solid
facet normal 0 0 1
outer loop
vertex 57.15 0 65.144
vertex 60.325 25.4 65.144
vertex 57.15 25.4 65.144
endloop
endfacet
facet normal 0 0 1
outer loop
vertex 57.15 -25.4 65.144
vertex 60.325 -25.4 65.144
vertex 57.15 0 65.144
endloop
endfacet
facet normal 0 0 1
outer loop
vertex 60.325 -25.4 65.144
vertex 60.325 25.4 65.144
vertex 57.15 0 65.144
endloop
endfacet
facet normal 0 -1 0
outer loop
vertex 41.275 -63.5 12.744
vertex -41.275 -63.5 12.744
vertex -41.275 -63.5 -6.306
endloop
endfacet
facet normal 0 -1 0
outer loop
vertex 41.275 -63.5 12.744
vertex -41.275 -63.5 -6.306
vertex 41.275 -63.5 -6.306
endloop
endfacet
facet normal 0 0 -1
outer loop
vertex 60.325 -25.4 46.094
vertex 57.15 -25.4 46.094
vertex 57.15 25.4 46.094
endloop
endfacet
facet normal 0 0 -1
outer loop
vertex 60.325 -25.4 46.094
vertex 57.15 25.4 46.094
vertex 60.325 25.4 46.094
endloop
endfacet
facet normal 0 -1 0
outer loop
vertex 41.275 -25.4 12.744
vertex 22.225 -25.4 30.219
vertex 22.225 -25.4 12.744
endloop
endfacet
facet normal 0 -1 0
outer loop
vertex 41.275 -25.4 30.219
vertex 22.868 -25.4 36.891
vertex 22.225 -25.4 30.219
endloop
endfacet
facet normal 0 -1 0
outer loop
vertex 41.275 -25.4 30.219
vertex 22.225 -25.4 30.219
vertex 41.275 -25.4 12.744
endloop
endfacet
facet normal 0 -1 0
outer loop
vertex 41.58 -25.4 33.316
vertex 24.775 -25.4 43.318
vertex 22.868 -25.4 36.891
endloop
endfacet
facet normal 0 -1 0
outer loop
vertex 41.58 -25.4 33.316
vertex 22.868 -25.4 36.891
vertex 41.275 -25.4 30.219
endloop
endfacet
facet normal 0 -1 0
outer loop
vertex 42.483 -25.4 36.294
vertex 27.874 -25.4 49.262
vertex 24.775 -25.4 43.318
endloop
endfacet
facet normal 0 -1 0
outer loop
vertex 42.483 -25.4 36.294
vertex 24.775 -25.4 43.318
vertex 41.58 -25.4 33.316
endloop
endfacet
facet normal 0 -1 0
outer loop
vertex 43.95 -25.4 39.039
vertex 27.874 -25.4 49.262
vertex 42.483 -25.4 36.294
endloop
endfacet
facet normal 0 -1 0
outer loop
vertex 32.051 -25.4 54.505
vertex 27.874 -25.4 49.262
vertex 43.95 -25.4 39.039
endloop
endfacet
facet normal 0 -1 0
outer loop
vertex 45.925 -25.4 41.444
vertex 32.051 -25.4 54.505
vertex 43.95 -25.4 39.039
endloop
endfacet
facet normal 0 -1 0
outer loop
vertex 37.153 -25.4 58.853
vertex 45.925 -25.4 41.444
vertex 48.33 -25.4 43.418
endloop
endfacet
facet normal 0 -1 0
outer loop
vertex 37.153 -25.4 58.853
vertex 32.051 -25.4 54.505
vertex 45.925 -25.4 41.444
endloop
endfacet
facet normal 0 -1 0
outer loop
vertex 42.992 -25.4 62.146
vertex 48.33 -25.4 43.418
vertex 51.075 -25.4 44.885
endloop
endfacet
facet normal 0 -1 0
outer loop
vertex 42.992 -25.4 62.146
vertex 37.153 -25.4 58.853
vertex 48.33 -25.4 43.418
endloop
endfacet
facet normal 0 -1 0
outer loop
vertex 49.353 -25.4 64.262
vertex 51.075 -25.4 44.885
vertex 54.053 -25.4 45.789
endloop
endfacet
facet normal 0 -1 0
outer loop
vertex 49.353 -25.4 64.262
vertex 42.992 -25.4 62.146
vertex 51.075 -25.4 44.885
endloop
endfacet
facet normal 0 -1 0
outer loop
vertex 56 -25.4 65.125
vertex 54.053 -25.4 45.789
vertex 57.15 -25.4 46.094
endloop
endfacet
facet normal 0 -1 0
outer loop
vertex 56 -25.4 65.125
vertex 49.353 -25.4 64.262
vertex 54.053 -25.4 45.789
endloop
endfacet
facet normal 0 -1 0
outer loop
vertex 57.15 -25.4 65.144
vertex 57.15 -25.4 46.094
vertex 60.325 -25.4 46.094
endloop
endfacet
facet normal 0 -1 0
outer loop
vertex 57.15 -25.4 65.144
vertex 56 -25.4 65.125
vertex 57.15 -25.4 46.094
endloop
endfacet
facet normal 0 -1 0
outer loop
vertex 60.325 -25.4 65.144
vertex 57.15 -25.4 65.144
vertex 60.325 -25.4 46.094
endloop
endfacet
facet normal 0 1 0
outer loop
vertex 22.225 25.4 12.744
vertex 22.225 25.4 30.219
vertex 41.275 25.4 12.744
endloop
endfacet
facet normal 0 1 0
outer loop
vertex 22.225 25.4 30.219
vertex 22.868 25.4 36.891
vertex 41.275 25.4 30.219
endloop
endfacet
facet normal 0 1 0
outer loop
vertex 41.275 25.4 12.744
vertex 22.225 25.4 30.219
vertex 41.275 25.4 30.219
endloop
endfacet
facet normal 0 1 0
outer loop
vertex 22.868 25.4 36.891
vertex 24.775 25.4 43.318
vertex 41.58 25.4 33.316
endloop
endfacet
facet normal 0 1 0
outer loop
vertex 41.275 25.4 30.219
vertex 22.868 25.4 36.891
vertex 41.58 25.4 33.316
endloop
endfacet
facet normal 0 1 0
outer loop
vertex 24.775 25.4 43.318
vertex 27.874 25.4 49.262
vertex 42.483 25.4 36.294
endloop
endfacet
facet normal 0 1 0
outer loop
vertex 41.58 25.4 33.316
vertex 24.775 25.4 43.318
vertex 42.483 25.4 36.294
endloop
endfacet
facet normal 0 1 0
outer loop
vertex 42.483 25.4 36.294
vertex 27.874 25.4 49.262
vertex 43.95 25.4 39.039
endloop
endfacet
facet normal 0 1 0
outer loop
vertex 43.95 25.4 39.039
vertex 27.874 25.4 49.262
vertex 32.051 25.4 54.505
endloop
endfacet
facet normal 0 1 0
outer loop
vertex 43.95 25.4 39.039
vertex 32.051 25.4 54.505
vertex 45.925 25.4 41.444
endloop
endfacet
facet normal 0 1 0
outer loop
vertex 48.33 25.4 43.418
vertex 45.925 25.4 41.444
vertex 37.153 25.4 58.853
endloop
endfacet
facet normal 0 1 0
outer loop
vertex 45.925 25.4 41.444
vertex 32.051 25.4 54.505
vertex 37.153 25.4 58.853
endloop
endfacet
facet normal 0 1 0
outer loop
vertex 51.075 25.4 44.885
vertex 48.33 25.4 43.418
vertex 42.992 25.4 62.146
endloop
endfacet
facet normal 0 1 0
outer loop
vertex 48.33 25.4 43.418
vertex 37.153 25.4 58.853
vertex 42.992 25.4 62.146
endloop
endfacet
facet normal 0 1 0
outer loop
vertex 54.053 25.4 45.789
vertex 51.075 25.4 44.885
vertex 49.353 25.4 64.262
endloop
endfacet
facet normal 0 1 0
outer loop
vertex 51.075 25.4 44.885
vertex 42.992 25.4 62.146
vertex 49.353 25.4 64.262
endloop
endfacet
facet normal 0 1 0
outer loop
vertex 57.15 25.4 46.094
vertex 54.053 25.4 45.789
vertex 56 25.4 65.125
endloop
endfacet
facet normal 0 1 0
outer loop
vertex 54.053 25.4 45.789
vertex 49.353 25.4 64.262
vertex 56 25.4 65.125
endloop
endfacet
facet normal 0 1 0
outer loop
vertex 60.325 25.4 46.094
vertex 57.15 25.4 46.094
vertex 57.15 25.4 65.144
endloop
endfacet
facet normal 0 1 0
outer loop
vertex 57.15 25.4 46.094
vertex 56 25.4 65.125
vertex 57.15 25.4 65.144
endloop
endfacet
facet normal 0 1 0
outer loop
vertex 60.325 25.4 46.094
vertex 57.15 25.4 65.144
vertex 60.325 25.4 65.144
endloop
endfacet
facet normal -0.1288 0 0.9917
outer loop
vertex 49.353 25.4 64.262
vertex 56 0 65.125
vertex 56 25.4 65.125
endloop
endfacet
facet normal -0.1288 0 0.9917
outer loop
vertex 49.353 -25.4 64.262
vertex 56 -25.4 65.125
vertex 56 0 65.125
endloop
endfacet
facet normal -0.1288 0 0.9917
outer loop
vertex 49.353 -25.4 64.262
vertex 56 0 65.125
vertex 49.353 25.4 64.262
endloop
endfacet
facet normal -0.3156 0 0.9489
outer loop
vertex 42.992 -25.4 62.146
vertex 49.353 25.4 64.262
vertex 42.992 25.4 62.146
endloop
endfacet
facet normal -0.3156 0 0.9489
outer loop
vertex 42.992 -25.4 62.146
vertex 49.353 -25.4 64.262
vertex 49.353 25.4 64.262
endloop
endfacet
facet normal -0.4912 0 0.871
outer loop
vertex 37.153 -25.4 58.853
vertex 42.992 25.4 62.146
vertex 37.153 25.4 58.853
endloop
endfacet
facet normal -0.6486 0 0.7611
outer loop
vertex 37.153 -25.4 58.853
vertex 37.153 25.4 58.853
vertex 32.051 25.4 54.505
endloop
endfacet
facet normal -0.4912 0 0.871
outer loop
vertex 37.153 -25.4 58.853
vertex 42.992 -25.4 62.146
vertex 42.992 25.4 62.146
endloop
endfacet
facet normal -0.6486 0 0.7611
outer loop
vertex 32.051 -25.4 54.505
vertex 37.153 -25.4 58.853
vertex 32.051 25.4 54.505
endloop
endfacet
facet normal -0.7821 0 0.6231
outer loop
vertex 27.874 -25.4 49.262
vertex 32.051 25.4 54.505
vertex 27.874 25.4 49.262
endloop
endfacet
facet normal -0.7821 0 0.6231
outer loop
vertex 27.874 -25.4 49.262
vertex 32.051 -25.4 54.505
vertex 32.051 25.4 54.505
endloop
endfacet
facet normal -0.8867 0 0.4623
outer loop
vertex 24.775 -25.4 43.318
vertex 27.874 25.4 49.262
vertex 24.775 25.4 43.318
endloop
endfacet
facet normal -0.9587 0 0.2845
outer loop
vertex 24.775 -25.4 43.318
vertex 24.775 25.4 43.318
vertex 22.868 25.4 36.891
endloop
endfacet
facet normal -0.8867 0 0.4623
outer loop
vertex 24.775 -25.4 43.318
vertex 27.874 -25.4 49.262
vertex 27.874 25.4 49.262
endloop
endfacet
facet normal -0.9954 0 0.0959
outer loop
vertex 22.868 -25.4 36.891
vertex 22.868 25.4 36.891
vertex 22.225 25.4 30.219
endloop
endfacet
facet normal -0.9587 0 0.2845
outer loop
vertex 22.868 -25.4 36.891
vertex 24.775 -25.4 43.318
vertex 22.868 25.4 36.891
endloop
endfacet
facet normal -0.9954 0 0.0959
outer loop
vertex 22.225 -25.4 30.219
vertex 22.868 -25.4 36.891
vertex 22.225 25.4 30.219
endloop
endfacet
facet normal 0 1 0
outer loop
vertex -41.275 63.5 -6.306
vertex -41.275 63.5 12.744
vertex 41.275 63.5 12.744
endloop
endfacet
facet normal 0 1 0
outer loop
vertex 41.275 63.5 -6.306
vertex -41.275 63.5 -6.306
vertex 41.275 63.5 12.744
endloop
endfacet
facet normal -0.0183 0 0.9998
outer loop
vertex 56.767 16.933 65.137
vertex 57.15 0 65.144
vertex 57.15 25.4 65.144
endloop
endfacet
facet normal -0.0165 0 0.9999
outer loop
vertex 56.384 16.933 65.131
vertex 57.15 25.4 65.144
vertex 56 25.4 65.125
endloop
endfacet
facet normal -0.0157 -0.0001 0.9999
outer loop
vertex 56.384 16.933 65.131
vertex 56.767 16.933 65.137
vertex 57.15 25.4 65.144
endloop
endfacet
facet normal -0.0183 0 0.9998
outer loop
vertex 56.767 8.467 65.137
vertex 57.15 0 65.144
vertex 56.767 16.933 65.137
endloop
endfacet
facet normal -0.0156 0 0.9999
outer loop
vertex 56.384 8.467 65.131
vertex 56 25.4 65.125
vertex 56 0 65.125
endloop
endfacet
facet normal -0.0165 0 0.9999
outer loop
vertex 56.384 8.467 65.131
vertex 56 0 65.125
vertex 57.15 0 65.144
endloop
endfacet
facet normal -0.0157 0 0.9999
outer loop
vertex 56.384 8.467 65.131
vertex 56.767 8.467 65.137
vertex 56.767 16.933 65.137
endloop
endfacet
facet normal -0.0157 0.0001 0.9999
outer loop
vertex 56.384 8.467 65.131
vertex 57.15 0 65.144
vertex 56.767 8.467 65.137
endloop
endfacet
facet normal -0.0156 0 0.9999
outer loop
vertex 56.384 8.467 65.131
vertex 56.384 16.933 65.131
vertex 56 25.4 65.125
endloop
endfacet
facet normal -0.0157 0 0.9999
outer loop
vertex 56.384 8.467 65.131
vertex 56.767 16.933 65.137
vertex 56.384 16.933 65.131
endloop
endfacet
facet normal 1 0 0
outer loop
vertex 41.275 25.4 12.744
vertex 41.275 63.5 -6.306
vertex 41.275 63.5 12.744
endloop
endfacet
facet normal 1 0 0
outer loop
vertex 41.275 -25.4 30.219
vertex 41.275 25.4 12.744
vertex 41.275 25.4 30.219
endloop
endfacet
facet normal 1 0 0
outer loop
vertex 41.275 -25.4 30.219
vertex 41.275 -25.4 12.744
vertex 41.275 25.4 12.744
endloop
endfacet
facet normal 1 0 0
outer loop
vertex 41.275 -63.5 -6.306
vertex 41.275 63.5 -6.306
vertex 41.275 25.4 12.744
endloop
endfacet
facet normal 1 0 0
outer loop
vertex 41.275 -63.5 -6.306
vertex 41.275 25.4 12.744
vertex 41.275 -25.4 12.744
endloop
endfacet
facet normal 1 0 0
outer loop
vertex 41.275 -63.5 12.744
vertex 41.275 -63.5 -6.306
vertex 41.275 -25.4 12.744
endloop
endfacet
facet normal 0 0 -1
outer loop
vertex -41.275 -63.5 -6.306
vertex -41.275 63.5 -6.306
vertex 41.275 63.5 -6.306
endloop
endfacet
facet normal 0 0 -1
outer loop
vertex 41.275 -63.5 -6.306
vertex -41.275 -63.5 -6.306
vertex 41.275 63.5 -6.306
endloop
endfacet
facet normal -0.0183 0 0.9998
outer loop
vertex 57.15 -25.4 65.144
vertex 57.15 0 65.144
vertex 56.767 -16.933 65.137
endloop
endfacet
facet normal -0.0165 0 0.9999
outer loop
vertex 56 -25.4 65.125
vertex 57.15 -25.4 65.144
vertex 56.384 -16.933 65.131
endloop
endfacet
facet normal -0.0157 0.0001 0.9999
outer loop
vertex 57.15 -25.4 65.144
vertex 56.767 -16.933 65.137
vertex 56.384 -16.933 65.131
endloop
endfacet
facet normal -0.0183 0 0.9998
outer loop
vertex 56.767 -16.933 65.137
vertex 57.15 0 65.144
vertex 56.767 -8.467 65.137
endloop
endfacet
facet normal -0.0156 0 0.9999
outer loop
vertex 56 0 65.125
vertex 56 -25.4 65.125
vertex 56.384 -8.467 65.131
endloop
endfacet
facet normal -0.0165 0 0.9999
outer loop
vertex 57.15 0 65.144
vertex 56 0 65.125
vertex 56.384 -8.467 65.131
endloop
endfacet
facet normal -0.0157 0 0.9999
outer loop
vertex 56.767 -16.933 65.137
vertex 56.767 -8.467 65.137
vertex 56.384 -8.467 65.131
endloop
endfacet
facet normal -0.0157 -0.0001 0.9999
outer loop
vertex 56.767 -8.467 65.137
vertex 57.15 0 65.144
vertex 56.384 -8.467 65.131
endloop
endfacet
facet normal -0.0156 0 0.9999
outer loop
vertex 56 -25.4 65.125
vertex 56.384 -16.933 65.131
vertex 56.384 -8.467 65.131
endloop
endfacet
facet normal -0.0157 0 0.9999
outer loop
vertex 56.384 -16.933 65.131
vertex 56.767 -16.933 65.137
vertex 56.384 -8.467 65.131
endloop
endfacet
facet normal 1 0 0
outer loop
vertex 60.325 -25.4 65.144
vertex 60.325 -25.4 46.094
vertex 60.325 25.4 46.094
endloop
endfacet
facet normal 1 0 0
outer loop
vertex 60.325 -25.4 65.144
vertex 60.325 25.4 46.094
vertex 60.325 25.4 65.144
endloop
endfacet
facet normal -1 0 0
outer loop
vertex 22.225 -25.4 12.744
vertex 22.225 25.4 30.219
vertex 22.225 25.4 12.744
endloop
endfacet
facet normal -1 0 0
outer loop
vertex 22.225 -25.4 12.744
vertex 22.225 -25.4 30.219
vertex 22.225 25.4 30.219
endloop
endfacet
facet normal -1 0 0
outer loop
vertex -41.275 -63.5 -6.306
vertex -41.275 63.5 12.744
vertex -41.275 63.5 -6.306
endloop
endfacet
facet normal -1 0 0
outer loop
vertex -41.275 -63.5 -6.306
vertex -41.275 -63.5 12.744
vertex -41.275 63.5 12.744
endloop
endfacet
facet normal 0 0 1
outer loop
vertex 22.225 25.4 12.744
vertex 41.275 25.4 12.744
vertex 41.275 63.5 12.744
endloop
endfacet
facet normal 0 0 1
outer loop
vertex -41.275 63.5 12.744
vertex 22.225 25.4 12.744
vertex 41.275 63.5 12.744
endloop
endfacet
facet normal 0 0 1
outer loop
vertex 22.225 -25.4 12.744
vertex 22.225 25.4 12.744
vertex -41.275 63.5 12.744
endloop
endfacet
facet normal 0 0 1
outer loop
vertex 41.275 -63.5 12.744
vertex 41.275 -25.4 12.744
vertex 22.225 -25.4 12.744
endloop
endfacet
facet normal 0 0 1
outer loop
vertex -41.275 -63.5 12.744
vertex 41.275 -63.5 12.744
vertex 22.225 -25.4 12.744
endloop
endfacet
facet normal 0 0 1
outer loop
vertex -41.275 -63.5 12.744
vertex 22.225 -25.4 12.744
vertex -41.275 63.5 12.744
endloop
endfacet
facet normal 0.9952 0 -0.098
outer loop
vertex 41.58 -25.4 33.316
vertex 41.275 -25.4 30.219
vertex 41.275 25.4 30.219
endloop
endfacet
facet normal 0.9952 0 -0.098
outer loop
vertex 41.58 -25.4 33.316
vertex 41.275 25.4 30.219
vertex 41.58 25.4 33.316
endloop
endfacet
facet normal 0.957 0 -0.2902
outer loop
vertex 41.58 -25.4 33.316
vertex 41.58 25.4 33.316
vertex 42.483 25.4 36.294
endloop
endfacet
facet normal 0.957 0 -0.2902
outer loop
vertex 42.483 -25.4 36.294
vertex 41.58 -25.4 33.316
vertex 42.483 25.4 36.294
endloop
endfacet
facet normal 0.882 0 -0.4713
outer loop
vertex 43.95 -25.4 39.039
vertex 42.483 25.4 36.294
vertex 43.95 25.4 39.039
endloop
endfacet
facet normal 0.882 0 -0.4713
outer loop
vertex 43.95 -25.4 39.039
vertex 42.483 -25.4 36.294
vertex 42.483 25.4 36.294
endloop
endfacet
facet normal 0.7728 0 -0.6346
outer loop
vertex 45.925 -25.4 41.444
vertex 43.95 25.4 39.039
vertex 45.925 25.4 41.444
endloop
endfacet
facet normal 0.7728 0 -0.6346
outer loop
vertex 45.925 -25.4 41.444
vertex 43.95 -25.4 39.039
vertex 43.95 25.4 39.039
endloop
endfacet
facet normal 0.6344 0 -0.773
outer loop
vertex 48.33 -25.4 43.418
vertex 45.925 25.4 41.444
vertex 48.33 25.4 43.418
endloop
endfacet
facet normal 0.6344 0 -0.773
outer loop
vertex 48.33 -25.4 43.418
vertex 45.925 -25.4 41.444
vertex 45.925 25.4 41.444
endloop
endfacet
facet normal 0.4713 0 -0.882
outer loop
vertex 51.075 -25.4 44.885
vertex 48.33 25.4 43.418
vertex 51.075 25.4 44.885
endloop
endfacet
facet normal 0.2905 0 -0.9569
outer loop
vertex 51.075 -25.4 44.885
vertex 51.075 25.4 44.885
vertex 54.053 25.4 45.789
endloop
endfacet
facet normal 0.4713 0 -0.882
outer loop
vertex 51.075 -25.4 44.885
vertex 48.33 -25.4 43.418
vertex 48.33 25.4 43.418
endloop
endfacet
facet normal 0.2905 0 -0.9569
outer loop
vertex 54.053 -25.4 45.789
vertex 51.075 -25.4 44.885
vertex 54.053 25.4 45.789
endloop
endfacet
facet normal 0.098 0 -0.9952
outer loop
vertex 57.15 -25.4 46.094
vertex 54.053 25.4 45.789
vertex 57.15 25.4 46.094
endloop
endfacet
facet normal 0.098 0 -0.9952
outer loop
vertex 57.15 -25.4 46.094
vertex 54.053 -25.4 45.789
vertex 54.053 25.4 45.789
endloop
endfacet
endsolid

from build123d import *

# Parameters (mm, degrees)
F1_DEPTH = 63.5
F2_DEPTH = 25.4


# Not quite as in the source:
# - a feature of the source that left no trace in its solid (it failed there, or was rolled back) is left out


with BuildPart() as f1:
    # F0 (on Front) → F1 (new body, symmetric)
    with BuildSketch(Plane.XZ):
        Polygon((22.225, 12.7436925435), (-41.275, 12.7436925435), (-41.275, -6.3063074565), (41.275, -6.3063074565), (41.275, 12.7436925435), align=None)
    extrude(amount=F1_DEPTH, both=True)

    # F0 (on Front) → F2 (join, symmetric)
    with BuildSketch(Plane.XZ):
        with BuildLine():
            Line((22.225, 30.2188925435), (22.225, 12.7436925435))
            Line((22.225, 12.7436925435), (41.275, 12.7436925435))
            Line((41.275, 12.7436925435), (41.275, 30.2188925435))
            ThreePointArc((41.275, 30.2188925435), (45.9246798487, 41.4442126948), (57.15, 46.0938925435))
            Line((57.15, 46.0938925435), (60.325, 46.0938925435))
            Line((60.325, 46.0938925435), (60.325, 65.1438925435))
            Line((60.325, 65.1438925435), (57.15, 65.1438925435))
            add(Edge.make_bspline(
                [(57.15, 65.1438925435), (56.7668826582, 65.1373961276), (56.3837003417, 65.1310994591), (56.0004776373, 65.1249697126)],
                knots=[0, 0, 0, 0, 0.9177220122, 0.9177220122, 0.9177220122, 0.9177220122], degree=3))
            ThreePointArc((56.0004776373, 65.1249697126), (32.0511684185, 54.5047789437), (22.225, 30.2188925435))
        make_face()
    extrude(amount=F2_DEPTH, both=True)


solid = f1.part
